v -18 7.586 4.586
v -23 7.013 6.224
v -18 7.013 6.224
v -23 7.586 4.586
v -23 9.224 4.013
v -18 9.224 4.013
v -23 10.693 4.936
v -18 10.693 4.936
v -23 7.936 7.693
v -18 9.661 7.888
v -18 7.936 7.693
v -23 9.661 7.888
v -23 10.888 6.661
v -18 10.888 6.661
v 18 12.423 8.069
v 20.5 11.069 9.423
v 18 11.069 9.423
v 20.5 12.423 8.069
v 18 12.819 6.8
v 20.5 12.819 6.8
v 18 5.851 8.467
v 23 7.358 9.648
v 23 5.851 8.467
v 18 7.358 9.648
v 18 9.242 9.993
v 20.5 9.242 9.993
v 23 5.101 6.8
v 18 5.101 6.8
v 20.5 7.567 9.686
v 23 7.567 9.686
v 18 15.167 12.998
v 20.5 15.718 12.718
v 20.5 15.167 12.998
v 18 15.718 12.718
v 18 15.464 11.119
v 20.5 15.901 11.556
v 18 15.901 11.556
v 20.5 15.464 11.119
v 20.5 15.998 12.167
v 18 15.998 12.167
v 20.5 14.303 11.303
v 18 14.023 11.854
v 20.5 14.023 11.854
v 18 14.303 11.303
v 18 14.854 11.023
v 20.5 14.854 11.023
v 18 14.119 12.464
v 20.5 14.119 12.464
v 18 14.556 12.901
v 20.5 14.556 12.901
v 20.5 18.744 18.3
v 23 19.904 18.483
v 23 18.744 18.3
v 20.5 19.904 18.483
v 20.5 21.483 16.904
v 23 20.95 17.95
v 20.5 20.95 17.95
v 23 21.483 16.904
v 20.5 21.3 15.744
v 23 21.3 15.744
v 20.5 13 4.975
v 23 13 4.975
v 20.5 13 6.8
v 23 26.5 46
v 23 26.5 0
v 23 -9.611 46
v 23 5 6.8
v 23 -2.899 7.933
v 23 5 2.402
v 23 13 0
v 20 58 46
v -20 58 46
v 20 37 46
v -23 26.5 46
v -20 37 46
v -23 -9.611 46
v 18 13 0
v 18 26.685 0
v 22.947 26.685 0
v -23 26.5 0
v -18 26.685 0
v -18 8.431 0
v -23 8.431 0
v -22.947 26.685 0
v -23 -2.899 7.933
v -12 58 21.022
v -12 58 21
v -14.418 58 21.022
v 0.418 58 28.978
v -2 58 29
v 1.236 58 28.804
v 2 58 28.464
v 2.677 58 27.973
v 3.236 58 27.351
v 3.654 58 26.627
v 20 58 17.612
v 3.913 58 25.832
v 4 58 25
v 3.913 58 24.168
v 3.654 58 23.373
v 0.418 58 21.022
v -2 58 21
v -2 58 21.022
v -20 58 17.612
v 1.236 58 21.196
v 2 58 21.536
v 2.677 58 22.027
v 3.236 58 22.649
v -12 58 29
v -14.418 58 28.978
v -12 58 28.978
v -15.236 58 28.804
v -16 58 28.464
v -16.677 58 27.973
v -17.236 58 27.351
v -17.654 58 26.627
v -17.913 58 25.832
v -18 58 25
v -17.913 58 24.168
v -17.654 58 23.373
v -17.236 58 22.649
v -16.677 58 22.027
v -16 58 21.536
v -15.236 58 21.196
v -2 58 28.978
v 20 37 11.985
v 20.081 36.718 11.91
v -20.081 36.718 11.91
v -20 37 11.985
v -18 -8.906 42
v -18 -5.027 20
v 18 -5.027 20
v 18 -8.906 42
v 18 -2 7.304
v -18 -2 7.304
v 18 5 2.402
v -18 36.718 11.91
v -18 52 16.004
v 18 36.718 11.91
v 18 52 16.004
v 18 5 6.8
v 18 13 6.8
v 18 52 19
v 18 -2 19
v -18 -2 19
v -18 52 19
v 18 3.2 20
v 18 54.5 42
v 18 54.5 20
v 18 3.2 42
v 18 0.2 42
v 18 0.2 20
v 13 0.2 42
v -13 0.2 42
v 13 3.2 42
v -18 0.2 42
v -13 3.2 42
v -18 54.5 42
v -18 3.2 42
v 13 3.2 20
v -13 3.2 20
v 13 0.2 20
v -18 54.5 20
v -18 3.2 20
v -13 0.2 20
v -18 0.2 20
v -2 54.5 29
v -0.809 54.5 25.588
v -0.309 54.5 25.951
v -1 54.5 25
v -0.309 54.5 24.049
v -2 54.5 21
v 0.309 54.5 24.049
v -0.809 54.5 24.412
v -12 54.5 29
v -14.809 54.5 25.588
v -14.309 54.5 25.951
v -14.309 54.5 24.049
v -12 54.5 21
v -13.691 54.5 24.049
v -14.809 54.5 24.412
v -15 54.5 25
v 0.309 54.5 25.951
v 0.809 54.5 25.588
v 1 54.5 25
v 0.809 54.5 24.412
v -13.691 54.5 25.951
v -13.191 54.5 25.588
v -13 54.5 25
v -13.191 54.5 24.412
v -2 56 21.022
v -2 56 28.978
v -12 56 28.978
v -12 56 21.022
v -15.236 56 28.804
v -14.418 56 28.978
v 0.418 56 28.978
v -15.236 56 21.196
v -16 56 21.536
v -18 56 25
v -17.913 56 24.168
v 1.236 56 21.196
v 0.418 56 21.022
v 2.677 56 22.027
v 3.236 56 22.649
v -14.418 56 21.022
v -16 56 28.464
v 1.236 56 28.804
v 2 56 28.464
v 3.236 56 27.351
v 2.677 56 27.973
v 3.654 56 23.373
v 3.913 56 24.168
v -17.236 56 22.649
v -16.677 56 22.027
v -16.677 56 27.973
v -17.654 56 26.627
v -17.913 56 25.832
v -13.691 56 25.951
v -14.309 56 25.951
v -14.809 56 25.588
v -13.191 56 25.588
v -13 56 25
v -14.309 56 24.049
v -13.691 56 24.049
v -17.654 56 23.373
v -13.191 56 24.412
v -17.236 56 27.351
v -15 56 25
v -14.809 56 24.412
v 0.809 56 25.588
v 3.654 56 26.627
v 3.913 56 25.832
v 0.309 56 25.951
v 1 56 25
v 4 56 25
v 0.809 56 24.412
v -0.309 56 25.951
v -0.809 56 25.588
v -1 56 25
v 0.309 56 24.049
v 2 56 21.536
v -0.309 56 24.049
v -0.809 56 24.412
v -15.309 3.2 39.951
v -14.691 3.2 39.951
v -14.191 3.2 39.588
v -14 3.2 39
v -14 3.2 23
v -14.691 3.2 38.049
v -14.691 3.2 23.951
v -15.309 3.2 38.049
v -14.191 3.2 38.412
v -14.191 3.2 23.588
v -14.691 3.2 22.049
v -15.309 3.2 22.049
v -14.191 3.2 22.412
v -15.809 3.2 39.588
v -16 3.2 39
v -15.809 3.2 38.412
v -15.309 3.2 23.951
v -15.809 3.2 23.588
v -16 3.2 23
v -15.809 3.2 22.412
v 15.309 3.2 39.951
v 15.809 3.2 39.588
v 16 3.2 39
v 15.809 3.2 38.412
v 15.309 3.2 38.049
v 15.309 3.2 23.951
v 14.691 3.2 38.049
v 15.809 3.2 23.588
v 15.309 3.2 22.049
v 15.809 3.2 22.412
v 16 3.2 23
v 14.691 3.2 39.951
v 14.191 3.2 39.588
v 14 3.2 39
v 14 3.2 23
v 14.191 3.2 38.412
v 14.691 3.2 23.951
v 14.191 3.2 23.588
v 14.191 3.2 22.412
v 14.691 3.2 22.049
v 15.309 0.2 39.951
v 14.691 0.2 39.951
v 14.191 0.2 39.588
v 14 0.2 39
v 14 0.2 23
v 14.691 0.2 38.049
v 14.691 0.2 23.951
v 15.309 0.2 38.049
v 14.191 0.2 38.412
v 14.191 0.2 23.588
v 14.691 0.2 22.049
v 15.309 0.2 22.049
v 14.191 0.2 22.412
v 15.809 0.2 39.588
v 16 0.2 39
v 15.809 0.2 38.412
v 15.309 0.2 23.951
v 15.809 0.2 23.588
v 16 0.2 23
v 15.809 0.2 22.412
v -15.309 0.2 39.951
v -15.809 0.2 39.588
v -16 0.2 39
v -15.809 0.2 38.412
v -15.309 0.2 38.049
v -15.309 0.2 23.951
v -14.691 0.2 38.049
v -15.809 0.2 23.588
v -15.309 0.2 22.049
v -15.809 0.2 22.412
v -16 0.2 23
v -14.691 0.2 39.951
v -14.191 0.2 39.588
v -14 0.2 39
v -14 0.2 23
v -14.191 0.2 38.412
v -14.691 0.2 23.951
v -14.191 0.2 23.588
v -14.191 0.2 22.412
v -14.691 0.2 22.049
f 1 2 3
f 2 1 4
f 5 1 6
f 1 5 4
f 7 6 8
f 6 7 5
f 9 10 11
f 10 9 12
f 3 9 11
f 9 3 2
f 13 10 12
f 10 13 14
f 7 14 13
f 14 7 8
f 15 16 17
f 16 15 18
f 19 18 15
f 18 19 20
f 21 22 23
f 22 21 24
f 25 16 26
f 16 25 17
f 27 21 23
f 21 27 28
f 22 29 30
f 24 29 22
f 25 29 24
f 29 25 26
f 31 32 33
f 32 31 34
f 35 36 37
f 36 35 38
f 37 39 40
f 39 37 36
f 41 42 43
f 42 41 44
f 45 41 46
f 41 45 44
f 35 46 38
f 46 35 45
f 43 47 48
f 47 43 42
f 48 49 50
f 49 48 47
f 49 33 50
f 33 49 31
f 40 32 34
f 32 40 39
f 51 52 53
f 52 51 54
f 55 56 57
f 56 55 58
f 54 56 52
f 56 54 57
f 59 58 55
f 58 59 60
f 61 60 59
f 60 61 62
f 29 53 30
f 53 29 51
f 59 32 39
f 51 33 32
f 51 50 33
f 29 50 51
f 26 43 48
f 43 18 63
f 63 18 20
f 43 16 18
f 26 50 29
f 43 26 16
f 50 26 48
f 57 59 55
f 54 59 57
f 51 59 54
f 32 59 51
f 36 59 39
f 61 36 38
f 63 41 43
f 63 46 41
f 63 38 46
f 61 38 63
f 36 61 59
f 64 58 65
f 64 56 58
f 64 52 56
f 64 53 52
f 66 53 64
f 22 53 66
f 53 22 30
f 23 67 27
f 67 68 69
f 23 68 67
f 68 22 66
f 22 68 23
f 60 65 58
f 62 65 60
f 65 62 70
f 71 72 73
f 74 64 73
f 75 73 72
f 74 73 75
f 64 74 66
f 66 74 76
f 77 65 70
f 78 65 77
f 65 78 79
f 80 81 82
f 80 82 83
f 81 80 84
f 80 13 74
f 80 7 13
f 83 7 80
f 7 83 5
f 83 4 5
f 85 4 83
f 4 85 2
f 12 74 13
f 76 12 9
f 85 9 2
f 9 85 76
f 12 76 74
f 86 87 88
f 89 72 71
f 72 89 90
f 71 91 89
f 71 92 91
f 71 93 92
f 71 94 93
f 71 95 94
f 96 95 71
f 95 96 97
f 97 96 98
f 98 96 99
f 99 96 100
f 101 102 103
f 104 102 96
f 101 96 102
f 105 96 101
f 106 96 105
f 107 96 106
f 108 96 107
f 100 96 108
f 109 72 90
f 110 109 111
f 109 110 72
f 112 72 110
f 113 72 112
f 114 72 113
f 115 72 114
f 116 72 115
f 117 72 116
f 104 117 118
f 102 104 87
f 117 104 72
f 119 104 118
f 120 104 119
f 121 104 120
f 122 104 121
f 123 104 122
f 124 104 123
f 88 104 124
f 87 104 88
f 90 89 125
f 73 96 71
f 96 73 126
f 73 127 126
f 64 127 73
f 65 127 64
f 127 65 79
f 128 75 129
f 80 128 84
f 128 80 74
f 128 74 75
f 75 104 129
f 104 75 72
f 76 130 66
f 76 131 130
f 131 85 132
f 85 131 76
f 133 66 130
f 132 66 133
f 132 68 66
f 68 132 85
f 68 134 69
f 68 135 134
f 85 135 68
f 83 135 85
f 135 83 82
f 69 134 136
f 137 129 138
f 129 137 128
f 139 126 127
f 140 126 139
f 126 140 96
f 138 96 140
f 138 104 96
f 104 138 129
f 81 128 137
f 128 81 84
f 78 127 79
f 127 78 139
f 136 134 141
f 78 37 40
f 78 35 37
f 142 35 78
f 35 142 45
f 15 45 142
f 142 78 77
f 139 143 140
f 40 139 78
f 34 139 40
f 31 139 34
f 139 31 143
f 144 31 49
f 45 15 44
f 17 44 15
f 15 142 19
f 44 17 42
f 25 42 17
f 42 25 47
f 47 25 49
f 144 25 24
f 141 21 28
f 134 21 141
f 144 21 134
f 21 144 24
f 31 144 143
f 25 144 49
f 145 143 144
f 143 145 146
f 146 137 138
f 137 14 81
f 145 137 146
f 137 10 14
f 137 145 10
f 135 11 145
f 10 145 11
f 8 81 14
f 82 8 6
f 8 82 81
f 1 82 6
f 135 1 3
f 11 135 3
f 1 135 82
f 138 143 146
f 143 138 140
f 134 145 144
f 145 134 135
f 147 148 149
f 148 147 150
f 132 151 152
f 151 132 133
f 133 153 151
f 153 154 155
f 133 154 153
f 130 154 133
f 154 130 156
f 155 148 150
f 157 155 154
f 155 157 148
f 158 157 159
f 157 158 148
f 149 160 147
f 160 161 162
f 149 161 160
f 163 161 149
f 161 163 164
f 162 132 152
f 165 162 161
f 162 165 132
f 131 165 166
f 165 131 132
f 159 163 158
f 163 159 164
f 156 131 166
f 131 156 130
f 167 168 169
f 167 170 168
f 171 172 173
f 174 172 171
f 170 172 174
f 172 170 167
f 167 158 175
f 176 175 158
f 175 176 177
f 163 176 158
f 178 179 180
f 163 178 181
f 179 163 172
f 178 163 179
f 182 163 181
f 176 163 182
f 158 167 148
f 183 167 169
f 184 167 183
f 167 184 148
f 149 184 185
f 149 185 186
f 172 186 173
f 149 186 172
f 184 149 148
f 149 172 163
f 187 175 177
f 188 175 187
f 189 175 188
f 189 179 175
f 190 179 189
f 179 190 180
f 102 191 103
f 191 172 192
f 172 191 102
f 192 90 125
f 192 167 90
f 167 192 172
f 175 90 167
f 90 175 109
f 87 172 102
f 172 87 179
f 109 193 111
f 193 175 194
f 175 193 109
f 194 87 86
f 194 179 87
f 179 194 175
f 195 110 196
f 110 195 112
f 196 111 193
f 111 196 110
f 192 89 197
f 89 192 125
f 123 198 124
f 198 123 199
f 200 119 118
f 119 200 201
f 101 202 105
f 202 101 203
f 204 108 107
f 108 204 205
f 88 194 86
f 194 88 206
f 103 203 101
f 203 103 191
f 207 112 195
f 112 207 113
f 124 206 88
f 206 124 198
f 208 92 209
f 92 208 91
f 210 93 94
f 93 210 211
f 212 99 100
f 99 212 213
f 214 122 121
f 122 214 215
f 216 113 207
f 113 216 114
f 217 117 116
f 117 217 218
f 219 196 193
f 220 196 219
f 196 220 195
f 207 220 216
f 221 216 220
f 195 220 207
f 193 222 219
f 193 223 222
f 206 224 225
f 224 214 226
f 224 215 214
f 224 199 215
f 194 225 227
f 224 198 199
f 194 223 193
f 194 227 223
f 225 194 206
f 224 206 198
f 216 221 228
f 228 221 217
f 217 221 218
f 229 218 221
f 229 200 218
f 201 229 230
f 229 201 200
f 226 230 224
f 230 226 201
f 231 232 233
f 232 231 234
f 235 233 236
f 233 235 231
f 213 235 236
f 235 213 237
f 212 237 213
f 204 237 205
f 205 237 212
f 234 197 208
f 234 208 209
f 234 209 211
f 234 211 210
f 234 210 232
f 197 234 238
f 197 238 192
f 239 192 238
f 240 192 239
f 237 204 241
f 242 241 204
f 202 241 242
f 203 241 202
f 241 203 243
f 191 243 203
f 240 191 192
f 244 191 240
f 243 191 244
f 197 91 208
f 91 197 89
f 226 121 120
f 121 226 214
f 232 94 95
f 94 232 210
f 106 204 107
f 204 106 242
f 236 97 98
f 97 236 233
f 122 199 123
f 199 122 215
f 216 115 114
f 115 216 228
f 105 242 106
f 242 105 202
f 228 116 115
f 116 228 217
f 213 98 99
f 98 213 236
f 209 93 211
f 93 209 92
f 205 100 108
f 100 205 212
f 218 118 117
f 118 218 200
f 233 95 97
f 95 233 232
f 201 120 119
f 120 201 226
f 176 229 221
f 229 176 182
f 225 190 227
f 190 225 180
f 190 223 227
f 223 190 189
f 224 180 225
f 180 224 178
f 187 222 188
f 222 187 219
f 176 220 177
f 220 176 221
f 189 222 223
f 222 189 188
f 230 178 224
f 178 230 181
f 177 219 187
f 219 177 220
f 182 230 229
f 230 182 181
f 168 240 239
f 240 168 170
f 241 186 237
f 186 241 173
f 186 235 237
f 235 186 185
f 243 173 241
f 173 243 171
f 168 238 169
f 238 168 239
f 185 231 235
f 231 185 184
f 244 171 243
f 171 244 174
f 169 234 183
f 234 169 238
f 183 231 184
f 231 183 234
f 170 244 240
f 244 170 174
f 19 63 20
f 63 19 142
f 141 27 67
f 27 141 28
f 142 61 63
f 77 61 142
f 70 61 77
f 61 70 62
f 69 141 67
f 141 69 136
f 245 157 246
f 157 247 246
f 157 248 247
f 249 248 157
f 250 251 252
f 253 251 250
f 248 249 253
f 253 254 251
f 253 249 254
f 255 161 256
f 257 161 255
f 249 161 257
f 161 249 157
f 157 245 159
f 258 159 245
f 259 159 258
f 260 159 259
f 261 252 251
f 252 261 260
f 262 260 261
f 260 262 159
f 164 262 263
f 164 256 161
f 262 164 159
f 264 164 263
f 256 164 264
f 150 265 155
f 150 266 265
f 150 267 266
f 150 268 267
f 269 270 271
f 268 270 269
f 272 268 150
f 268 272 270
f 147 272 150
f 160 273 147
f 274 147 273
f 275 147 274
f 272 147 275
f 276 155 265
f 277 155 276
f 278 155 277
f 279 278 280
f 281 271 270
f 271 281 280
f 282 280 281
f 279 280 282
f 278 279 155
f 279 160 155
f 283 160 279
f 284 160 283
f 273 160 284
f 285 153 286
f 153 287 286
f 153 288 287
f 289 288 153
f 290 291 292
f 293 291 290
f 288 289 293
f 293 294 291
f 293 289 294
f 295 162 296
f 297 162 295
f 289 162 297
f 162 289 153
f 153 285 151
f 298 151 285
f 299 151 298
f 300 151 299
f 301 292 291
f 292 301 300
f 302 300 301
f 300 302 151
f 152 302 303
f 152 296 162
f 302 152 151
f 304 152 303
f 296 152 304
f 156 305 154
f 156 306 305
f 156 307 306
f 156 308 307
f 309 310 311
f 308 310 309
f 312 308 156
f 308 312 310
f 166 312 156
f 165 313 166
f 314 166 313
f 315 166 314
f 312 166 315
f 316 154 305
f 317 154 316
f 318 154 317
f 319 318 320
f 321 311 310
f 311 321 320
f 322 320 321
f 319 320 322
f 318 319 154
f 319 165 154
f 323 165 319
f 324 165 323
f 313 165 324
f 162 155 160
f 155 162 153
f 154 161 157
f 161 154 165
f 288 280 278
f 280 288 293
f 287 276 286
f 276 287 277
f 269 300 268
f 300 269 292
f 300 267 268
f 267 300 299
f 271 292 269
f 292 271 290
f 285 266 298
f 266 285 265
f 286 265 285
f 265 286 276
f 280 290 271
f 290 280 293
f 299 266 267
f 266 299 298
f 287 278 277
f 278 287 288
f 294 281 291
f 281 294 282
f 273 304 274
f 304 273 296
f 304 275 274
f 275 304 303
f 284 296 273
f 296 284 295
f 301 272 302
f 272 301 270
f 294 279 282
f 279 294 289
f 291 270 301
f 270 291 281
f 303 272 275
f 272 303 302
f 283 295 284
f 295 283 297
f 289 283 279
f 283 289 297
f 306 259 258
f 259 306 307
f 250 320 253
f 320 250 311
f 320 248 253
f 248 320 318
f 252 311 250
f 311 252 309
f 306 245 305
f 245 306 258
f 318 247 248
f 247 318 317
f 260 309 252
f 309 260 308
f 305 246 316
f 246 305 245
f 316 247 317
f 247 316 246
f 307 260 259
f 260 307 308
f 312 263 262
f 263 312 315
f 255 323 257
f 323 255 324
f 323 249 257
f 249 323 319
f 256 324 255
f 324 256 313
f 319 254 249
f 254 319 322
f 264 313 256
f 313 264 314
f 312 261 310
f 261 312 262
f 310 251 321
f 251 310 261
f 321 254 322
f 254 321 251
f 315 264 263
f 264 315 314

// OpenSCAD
//Medidas camara:
x_cam=38; //fija
y_cam=42;

ancho=x_cam+10;

module eje_micro_servo(){
		translate([-25,0,0])rotate([0,90,0])cylinder(r=2,h=50);

		translate([0,0,0])rotate([0,90,0])cylinder(r=4,h=25);
		translate([0,0,8.5])rotate([0,90,0])cylinder(r=1,h=25,$fn=10);
		hull(){
			translate([x_cam/2+1.5,0,0])rotate([0,90,0])cylinder(r=3.9,h=40);
			translate([x_cam/2+1.5,0,15])rotate([0,90,0])cylinder(r=1.9,h=40,$fn=10);
		}
}

module lifecam (){
	color("red")import("../stl/ChasisLifecam.stl");
	//color("purple")translate([-12,10,1])rotate([90,0,0])cube([24,38,20]);

}

module servo(){
	color("black")import("../stl/CuelloV2.stl");
}

altura=5;
largo=30;
ancho1=13;

module ear(){
	translate([8,-9,45.9])hull(){
		translate([0,0,altura])sphere(0.1);
		translate([ancho1,0,altura])sphere(0.1);
		translate([0,8,altura])sphere(0.1);
		translate([ancho1,8,altura])sphere(0.1);

		translate([2,largo,0])sphere(0.1);
		translate([ancho1-2,largo,0])sphere(0.1);

		translate([-2,0,0])sphere(0.1);
		translate([ancho1+2,0,0])sphere(0.1);
		translate([-2,8,0])sphere(0.1);
		translate([ancho1+2,8,0])sphere(0.1);
	}
}


color("red")
translate([0,9,6])
rotate([0,0,0])
translate([0,-9,-6])
union(){
difference(){

//CUERPO BASE
	translate([-(x_cam+8)/2,-10,0])cube([x_cam+8,68,y_cam+4]);
hull(){
	translate([24,23,0])rotate([0,0,0])cube(80);
	translate([20,37,0])rotate([0,0,0])cube(80);
}
mirror([1,0,0])hull(){
	translate([24,23,0])rotate([0,0,0])cube(80);
	translate([20,37,0])rotate([0,0,0])cube(80);
}

	translate([-35,-1.5,0])rotate([100,0,0])cube([70,68,y_cam+4]);	
	translate([-35,17,-6])rotate([145,0,0])cube([70,68,y_cam+4]);
	//debug
	//translate([0,-10,0])cube([x_cam+9,69,y_cam+5]);


hull(){
	translate([-35,45,-19])
		rotate([15,0,0])cube([70,40,32]);
	translate([-35,25,-32])
		cube([70,40,30]);
}
	

//Cajeado interno
	//translate([-(x_cam-2)/2,-11,-1])cube([x_cam-2,63,y_cam+1]);
	translate([-(x_cam-2)/2,-2,-1])cube([x_cam-2,54,20]);
	//translate([-(x_cam-2)/2,-11,-1])cube([x_cam-2,63,16]);
	translate([-(x_cam-2)/2,-11,20])cube([x_cam-2,65.5,22]);

//Boquete para el cable

	translate([-12,41,21])cube([10,30,8]);
hull(){
	translate([-14,56,25])rotate([-90,0,0])cylinder(r=4,h=30,$fn=30);
	translate([0,56,25])rotate([-90,0,0])cylinder(r=4,h=30,$fn=30);
}
translate([-14,50,25])rotate([-90,0,0])cylinder(r=1,h=30,$fn=10);
	translate([0,50,25])rotate([-90,0,0])cylinder(r=1,h=30,$fn=10);
	


//Eje del servo
	translate([0,9,6])rotate([-45,0,0]) eje_micro_servo();
	translate([x_cam/2-2,5,-1])cube([7,8,7.8]);
}

	translate([0,-2,31])rotate([-90,0,0]){
		//%lifecam();
		difference(){
			translate([-18,-11,2.2])cube([36,22,3]);
			translate([-13,-12,1.2])cube([26,24,9]);
			translate([15,-8,1.2])cylinder(r=1,h=30,$fn=10);
			translate([15,8,1.2])cylinder(r=1,h=30,$fn=10);
			translate([-15,-8,1.2])cylinder(r=1,h=30,$fn=10);
			translate([-15,8,1.2])cylinder(r=1,h=30,$fn=10);
		}
	}

}
	//translate([-17,47+3,0])rotate([0,0,-90])servo();



//ear();
//mirror([1,0,0])ear();
